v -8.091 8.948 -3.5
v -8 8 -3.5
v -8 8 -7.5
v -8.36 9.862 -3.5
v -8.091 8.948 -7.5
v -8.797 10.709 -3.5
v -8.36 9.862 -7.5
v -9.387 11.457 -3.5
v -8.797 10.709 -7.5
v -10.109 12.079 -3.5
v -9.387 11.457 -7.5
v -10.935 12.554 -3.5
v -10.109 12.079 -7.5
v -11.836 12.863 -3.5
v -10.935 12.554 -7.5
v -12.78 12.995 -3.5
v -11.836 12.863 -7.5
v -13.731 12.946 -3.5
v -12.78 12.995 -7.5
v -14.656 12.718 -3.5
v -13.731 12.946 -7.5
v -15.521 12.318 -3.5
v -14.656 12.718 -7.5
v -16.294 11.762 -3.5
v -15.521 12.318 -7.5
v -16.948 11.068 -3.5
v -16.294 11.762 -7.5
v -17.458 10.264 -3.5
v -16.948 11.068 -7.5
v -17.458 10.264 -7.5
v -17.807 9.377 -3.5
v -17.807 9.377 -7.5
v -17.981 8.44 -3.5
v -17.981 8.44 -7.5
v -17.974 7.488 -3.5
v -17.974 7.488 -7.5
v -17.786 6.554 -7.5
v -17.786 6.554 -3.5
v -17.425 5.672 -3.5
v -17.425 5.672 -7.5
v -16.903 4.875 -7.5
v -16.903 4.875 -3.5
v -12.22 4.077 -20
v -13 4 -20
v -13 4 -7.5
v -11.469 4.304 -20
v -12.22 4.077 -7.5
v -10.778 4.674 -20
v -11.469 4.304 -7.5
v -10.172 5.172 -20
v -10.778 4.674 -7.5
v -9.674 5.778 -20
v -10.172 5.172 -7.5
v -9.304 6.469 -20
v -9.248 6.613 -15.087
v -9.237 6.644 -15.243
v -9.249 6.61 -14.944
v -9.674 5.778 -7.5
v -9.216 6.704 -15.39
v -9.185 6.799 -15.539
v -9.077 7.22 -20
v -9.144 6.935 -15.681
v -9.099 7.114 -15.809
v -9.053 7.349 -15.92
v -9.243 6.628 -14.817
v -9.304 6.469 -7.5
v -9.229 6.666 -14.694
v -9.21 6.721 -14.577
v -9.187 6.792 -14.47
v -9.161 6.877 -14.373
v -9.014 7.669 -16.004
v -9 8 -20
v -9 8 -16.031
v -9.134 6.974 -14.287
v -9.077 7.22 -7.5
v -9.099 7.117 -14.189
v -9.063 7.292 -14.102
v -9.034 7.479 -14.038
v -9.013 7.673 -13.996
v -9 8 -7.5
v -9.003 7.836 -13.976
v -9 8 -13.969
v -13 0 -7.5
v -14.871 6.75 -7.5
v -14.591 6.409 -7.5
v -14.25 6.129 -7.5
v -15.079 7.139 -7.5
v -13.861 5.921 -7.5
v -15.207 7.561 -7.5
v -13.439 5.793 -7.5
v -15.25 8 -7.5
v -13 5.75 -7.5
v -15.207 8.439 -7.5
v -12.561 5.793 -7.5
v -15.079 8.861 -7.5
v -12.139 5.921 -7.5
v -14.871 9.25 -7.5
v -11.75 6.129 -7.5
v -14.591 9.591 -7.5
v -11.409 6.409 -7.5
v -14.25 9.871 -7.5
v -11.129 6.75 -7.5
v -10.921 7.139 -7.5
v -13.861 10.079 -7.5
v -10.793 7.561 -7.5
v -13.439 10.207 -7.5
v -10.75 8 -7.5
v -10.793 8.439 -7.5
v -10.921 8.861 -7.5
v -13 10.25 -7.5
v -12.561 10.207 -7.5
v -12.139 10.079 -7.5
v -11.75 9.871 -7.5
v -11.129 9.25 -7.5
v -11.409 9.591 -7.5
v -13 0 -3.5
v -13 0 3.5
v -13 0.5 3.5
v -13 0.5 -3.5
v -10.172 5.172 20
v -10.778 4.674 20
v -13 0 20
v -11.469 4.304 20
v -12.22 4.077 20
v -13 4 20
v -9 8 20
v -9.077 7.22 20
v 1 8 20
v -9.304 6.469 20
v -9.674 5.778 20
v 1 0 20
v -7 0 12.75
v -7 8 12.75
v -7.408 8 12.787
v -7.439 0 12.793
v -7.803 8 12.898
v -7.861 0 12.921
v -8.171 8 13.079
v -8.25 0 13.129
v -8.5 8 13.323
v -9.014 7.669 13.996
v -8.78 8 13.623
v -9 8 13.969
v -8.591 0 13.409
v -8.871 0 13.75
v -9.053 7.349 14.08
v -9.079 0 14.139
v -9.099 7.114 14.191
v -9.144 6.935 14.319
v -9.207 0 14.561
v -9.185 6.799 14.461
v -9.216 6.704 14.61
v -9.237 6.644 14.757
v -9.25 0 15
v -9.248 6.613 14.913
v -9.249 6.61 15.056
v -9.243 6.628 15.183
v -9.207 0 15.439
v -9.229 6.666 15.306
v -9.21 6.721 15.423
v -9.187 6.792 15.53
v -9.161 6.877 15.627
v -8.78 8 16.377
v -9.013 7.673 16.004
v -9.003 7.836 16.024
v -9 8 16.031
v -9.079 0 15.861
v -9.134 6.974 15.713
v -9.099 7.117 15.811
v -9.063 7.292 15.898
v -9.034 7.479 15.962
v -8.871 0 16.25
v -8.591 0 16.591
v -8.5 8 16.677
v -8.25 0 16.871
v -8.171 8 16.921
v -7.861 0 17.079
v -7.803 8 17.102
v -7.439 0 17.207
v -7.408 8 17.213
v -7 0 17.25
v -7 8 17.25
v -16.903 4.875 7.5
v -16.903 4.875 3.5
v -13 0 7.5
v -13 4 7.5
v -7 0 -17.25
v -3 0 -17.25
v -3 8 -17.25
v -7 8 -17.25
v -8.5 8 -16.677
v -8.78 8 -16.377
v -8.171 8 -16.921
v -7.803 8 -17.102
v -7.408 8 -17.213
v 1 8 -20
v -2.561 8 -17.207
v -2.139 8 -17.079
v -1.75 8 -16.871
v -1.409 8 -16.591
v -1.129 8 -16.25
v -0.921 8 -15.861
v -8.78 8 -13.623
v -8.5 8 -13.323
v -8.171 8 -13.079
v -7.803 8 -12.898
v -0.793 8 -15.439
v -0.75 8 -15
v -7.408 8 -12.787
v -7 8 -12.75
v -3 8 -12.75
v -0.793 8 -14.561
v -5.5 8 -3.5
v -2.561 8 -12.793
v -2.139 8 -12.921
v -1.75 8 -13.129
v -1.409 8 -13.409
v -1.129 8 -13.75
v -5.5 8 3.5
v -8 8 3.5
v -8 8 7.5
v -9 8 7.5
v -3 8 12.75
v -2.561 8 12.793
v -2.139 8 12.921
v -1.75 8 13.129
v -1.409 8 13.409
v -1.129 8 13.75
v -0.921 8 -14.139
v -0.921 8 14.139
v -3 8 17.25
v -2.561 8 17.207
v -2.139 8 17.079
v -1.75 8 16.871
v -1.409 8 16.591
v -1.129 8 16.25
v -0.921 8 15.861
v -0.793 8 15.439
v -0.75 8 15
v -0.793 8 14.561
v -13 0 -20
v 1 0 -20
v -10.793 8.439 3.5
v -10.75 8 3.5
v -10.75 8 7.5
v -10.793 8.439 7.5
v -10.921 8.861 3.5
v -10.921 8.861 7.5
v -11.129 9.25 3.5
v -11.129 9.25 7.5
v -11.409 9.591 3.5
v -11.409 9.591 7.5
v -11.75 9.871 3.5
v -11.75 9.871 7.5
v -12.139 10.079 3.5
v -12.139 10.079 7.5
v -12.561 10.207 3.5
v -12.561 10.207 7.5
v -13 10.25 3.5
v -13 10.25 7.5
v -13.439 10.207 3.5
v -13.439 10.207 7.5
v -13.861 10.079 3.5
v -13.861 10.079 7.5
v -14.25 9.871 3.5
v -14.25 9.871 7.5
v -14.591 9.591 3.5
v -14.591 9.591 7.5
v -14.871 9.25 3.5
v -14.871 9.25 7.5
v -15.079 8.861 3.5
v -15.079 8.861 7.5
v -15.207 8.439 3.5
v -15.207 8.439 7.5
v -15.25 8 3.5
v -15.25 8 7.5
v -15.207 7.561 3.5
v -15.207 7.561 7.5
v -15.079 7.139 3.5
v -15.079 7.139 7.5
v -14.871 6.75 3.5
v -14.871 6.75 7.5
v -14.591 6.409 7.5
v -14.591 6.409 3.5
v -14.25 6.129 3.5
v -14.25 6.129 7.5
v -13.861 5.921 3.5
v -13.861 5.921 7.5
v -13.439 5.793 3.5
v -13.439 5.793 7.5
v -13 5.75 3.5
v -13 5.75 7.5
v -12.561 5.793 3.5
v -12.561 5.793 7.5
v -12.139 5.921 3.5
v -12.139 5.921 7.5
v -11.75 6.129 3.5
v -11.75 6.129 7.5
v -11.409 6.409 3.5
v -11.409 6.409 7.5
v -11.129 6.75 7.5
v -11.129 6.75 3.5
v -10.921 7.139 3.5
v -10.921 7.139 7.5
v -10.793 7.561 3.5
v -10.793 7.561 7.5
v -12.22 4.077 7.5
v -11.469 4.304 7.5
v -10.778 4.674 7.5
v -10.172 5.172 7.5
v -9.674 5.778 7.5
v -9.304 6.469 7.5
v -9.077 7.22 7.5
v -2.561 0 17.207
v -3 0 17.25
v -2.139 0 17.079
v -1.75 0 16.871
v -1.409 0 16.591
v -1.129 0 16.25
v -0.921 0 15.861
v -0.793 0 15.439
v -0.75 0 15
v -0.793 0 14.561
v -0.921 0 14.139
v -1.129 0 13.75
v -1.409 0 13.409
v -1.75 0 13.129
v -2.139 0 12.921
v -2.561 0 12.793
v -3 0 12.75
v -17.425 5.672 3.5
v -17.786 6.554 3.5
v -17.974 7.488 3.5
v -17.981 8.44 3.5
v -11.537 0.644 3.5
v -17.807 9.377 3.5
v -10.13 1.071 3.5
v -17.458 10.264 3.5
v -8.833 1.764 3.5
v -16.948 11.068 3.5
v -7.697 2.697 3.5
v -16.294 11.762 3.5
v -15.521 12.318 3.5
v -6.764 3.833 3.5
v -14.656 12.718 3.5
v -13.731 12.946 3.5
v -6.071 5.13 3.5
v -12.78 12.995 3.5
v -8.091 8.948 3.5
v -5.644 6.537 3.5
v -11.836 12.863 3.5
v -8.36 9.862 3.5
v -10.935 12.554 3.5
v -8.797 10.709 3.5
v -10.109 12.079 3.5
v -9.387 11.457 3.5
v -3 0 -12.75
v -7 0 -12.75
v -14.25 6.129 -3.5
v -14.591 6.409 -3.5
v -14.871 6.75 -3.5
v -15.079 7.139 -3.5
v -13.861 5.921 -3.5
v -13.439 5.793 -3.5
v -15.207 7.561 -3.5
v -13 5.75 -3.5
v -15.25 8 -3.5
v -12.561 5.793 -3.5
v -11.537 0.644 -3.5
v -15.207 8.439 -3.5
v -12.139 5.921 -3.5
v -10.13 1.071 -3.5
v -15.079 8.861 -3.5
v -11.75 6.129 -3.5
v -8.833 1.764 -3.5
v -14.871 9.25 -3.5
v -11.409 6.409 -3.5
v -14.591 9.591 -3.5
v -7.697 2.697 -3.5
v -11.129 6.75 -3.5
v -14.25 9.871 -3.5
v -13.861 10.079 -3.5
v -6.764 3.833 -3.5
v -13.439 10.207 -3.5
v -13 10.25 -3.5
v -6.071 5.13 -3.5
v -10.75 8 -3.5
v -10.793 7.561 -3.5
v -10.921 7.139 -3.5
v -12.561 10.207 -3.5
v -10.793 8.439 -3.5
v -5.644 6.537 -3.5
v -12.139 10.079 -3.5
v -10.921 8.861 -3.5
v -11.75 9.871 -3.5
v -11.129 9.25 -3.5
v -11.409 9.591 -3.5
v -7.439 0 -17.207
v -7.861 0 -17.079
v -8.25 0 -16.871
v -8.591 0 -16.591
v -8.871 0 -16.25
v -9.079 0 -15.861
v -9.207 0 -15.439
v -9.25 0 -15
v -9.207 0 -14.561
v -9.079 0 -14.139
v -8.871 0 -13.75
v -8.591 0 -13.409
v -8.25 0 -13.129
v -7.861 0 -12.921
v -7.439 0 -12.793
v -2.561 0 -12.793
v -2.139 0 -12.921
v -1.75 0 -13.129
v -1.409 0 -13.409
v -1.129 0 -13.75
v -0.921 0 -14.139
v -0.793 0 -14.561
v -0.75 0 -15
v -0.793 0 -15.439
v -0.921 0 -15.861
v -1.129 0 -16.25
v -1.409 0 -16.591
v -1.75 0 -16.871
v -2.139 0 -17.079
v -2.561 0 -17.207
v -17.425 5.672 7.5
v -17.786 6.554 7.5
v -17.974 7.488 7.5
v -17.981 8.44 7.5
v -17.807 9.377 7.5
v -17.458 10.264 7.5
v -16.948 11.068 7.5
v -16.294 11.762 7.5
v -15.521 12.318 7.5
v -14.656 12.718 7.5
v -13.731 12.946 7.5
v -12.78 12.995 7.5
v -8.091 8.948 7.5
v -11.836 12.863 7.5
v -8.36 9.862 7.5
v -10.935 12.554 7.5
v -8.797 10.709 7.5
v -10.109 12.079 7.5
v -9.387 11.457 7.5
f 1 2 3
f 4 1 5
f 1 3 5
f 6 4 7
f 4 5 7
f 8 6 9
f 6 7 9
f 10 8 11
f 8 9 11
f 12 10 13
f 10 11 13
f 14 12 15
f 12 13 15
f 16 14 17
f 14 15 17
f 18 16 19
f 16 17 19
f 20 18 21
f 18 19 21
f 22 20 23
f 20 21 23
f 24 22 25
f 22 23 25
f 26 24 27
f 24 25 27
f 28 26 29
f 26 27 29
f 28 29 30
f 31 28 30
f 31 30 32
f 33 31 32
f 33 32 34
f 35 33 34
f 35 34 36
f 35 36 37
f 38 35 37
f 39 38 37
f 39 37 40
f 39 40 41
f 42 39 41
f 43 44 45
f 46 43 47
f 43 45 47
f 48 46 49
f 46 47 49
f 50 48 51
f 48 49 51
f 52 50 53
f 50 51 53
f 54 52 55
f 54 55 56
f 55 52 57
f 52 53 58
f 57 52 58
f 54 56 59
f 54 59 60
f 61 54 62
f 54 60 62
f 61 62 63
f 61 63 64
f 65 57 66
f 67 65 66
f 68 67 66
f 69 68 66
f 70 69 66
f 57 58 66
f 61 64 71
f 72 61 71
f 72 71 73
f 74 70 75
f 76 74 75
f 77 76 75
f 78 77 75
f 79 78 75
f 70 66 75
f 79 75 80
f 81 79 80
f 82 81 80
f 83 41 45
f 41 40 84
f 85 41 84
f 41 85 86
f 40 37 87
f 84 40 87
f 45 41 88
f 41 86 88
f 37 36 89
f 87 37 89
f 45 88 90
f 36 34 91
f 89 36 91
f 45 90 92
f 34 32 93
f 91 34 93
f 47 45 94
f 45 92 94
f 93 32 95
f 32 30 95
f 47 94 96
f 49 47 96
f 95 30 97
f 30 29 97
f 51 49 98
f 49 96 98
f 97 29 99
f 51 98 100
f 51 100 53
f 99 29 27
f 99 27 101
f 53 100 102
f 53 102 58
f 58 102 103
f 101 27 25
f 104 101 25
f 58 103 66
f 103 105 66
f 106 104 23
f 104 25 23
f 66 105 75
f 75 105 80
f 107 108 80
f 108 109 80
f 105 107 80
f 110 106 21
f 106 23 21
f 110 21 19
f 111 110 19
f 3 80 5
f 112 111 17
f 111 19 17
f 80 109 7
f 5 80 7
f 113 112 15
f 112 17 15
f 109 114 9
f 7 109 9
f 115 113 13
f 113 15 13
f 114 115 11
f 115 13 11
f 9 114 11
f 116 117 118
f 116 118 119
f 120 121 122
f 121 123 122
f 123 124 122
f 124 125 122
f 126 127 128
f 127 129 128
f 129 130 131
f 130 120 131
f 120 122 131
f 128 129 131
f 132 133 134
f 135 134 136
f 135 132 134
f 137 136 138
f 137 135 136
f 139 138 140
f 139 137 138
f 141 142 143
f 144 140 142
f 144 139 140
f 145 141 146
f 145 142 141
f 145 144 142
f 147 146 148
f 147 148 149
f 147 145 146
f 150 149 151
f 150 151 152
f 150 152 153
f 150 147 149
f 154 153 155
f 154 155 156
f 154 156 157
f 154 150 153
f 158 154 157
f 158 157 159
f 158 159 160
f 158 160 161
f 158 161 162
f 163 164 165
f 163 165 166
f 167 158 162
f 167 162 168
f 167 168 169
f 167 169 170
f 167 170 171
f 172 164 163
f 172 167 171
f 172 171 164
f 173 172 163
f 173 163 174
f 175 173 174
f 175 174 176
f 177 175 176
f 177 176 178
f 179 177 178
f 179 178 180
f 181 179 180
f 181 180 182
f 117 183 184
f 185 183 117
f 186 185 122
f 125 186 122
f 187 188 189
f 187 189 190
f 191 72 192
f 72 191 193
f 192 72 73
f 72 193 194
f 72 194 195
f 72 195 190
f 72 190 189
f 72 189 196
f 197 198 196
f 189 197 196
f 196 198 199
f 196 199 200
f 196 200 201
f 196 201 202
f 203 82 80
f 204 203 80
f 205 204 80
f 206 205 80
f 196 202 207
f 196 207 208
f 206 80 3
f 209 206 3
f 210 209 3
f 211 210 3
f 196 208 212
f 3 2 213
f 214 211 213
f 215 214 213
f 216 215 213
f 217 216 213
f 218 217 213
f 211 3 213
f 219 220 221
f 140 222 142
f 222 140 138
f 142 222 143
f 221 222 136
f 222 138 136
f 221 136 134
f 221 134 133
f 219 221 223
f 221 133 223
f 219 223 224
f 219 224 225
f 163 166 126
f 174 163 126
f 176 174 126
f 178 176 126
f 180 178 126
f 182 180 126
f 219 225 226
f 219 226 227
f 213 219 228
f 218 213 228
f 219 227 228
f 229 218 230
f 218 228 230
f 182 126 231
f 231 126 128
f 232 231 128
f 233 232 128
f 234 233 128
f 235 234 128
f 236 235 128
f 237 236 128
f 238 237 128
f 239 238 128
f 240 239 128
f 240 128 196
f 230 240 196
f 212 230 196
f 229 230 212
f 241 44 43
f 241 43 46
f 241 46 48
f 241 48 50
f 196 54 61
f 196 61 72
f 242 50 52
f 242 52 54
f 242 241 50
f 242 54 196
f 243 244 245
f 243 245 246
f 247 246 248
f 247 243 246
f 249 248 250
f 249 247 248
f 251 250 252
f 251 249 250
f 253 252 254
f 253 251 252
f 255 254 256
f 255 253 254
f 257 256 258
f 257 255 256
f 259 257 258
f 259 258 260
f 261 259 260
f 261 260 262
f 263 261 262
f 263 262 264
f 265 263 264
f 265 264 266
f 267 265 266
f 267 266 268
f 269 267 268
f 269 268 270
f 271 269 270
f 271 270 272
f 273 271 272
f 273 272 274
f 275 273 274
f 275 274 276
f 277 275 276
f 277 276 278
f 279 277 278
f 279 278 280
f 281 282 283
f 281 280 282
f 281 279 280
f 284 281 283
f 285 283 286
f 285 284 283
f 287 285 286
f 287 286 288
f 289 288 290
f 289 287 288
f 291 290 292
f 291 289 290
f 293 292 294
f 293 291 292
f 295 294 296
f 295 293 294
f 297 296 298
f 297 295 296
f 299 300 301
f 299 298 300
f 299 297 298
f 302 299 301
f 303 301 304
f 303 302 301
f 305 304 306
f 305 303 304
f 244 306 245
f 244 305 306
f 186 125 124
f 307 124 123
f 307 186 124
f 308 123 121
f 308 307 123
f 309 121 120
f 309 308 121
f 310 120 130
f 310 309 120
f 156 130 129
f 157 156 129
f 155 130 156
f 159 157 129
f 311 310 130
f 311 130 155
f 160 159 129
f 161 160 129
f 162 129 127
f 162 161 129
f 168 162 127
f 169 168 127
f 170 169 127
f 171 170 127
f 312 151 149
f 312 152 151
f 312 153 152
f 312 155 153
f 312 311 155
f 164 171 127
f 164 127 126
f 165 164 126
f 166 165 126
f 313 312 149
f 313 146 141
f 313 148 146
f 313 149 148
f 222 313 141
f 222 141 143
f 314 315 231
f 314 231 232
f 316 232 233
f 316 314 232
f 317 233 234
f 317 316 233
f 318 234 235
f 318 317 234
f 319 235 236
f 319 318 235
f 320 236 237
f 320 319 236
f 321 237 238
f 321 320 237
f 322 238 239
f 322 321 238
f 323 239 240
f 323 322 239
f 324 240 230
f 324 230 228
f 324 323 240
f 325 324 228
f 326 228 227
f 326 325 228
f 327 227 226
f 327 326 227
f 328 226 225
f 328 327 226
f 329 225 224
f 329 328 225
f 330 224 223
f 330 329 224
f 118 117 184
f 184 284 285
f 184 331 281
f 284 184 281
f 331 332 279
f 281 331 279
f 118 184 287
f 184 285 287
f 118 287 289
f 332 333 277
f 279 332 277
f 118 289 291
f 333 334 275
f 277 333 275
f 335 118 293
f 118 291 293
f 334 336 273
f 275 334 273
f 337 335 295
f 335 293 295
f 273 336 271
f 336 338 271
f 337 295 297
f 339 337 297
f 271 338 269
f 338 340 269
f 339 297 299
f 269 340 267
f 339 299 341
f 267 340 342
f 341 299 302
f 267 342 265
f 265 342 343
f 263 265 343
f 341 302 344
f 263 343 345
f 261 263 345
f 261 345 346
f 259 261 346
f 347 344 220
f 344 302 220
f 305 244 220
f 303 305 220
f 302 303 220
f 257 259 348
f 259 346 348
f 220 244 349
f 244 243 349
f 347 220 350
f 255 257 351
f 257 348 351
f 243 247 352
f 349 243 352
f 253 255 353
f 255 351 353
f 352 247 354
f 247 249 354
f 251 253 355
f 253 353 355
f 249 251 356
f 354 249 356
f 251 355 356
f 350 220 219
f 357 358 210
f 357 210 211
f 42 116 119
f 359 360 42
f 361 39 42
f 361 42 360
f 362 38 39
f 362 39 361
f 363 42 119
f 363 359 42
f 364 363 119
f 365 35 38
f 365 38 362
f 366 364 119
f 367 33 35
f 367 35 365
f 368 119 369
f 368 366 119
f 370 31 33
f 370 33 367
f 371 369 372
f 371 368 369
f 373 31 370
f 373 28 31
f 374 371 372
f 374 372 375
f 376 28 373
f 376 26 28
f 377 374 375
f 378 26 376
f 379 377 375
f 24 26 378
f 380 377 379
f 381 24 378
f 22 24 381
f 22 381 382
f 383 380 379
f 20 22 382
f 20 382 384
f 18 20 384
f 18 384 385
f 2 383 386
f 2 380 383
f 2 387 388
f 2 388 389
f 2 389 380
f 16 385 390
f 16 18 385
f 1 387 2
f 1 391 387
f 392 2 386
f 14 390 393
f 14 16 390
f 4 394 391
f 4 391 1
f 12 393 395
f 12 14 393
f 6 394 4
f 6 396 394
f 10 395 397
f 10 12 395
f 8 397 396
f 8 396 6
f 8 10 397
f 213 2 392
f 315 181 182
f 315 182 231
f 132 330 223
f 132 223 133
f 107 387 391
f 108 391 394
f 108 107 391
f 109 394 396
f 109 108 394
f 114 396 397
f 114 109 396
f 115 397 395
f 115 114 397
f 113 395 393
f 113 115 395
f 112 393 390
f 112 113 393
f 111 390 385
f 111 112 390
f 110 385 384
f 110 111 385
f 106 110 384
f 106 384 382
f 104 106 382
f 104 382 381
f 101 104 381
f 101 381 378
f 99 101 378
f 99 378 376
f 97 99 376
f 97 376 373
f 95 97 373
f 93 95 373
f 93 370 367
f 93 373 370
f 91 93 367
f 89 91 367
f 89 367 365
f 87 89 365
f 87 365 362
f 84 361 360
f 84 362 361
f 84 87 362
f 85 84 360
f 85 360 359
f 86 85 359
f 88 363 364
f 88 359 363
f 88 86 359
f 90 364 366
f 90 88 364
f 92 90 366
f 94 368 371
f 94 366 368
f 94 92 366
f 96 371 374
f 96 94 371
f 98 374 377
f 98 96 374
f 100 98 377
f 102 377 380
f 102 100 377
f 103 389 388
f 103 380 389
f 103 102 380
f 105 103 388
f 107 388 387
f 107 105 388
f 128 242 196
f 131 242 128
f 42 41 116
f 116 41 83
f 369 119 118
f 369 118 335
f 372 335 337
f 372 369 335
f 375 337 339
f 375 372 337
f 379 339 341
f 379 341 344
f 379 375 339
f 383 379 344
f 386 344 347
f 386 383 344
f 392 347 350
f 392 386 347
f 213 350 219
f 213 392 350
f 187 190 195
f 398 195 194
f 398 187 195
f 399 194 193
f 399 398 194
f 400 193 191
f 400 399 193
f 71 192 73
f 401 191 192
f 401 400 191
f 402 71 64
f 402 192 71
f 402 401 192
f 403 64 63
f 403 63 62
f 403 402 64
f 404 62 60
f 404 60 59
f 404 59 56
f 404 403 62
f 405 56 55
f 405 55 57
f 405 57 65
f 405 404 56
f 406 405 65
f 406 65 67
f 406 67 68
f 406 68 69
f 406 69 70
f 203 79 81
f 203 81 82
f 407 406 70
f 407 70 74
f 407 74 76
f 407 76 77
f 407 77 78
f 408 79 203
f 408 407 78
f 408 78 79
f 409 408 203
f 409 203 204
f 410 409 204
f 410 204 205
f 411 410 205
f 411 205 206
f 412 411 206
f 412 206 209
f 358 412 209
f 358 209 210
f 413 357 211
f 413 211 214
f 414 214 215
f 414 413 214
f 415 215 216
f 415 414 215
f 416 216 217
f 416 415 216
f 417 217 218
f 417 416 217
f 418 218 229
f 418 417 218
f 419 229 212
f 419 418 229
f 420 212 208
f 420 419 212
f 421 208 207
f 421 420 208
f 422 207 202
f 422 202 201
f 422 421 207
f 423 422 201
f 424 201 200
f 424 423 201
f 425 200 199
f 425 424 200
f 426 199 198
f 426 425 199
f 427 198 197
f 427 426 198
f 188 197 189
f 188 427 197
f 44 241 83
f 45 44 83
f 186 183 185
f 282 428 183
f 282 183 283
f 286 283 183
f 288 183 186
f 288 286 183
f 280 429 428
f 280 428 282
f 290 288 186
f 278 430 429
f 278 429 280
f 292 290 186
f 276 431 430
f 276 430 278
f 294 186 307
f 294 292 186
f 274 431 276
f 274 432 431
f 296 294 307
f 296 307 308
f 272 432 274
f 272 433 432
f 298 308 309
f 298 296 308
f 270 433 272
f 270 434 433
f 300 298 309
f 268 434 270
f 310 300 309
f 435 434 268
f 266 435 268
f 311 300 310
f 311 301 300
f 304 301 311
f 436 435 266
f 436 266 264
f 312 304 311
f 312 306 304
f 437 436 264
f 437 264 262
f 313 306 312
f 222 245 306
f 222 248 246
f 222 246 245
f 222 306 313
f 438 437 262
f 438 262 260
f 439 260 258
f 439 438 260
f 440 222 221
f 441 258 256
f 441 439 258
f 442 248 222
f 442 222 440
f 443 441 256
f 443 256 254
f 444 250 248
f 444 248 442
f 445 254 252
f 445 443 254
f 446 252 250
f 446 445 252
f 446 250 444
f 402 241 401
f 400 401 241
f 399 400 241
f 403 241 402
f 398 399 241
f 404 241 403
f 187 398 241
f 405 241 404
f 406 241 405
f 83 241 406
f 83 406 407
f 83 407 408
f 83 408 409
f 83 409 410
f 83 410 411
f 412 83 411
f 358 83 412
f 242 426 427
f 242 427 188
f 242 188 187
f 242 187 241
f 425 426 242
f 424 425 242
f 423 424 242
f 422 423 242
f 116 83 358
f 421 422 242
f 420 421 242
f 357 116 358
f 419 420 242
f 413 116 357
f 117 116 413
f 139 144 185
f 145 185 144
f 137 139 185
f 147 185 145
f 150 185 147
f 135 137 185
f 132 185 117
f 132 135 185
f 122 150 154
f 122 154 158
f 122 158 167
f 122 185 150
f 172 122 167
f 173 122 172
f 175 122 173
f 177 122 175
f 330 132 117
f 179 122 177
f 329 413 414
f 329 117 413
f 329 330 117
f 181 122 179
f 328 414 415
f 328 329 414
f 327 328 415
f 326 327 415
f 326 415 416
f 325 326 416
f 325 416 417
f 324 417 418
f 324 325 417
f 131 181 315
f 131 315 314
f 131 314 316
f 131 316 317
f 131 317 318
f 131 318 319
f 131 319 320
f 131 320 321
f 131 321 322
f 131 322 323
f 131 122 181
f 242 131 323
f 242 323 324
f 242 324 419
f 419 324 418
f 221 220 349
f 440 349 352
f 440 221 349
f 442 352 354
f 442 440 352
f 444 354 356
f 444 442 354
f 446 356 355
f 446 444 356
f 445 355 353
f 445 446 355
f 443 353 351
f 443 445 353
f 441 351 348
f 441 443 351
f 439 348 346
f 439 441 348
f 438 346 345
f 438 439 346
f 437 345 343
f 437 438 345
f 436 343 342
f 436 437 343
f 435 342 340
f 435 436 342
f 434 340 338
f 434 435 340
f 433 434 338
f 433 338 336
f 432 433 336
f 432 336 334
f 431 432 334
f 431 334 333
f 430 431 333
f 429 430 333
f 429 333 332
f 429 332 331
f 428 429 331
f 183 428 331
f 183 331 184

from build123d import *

# Parameters (mm, degrees)
SKETCH1_W               = 13
SKETCH1_H               = 15
BOSS_EXTRUDE1_DEPTH     = 8
BOSS_EXTRUDE2_DEPTH     = 4
SKETCH6_W               = 14
SKETCH6_H               = 40
BOSS_EXTRUDE3_DEPTH     = 8
SKETCH3_R               = 7.5
CUT_EXTRUDE1_DEPTH      = 7
CUT_EXTRUDE2_DEPTH      = 36.344730866
CUT_EXTRUDE2_DEPTH_BACK = 36.344730866
SKETCH4_R               = 2.25
SKETCH7_R               = 4
CUT_EXTRUDE3_DEPTH      = 36.344730866


with BuildPart() as part:
    # Sketch1 → Boss-Extrude1 (new body)
    with BuildSketch(Plane(origin=(0, 0, 0), x_dir=(1, 0, 0), z_dir=(0, 1, 0))):
        with Locations((-6.5, 0)):
            Rectangle(SKETCH1_W, SKETCH1_H)
    extrude(amount=BOSS_EXTRUDE1_DEPTH)

    # Sketch2 → Boss-Extrude2 (add)
    with BuildSketch(Plane.XY.offset(7.5)):
        with BuildLine():
            Line((-16.903123749, 4.875), (-13, 0))
            Line((-13, 0), (-13, 3))
            ThreePointArc((-13, 3), (-10.834936491, 12.506939094), (-16.903123749, 4.875))
        make_face()
    boss_extrude2 = extrude(amount=-BOSS_EXTRUDE2_DEPTH)

    # Mirror1: Boss-Extrude2 across plane
    add(boss_extrude2.mirror(Plane.XY))

    # Sketch6 → Boss-Extrude3 (add)
    with BuildSketch(Plane.XZ):
        with Locations((-6, 0)):
            Rectangle(SKETCH6_W, SKETCH6_H)
        with BuildLine():
            Line((-7, 17.25), (-3, 17.25))
            ThreePointArc((-3, 17.25), (-0.75, 15), (-3, 12.75))
            Line((-3, 12.75), (-7, 12.75))
            ThreePointArc((-7, 12.75), (-9.25, 15), (-7, 17.25))
        make_face(mode=Mode.SUBTRACT)
        with BuildLine():
            Line((-7, -12.75), (-3, -12.75))
            ThreePointArc((-3, -12.75), (-0.75, -15), (-3, -17.25))
            Line((-3, -17.25), (-7, -17.25))
            ThreePointArc((-7, -17.25), (-9.25, -15), (-7, -12.75))
        make_face(mode=Mode.SUBTRACT)
    extrude(amount=-BOSS_EXTRUDE3_DEPTH)

    # Sketch3 → Cut-Extrude1 (cut)
    with BuildSketch(Plane.XY.offset(-3.5)):
        with Locations((-13, 8)):
            Circle(SKETCH3_R)
    extrude(amount=CUT_EXTRUDE1_DEPTH, mode=Mode.SUBTRACT)

    # Sketch4 → Cut-Extrude2 (cut, two sides: drawn at the far end of the back side and taken through both)
    with BuildSketch(Plane.XY.offset(7.5).offset(-CUT_EXTRUDE2_DEPTH_BACK)):
        with Locations((-13, 8)):
            Circle(SKETCH4_R)
    extrude(amount=CUT_EXTRUDE2_DEPTH + CUT_EXTRUDE2_DEPTH_BACK, mode=Mode.SUBTRACT)

    # Sketch7 → Cut-Extrude3 (cut, through all)
    with BuildSketch(Plane.XY.offset(7.5)):
        with Locations((-13, 8)):
            Circle(SKETCH7_R)
    cut_extrude3 = extrude(amount=CUT_EXTRUDE3_DEPTH, mode=Mode.SUBTRACT)

    # Mirror2: Cut-Extrude3 across plane
    add(cut_extrude3.mirror(Plane.XY), mode=Mode.SUBTRACT)


solid = part.part
